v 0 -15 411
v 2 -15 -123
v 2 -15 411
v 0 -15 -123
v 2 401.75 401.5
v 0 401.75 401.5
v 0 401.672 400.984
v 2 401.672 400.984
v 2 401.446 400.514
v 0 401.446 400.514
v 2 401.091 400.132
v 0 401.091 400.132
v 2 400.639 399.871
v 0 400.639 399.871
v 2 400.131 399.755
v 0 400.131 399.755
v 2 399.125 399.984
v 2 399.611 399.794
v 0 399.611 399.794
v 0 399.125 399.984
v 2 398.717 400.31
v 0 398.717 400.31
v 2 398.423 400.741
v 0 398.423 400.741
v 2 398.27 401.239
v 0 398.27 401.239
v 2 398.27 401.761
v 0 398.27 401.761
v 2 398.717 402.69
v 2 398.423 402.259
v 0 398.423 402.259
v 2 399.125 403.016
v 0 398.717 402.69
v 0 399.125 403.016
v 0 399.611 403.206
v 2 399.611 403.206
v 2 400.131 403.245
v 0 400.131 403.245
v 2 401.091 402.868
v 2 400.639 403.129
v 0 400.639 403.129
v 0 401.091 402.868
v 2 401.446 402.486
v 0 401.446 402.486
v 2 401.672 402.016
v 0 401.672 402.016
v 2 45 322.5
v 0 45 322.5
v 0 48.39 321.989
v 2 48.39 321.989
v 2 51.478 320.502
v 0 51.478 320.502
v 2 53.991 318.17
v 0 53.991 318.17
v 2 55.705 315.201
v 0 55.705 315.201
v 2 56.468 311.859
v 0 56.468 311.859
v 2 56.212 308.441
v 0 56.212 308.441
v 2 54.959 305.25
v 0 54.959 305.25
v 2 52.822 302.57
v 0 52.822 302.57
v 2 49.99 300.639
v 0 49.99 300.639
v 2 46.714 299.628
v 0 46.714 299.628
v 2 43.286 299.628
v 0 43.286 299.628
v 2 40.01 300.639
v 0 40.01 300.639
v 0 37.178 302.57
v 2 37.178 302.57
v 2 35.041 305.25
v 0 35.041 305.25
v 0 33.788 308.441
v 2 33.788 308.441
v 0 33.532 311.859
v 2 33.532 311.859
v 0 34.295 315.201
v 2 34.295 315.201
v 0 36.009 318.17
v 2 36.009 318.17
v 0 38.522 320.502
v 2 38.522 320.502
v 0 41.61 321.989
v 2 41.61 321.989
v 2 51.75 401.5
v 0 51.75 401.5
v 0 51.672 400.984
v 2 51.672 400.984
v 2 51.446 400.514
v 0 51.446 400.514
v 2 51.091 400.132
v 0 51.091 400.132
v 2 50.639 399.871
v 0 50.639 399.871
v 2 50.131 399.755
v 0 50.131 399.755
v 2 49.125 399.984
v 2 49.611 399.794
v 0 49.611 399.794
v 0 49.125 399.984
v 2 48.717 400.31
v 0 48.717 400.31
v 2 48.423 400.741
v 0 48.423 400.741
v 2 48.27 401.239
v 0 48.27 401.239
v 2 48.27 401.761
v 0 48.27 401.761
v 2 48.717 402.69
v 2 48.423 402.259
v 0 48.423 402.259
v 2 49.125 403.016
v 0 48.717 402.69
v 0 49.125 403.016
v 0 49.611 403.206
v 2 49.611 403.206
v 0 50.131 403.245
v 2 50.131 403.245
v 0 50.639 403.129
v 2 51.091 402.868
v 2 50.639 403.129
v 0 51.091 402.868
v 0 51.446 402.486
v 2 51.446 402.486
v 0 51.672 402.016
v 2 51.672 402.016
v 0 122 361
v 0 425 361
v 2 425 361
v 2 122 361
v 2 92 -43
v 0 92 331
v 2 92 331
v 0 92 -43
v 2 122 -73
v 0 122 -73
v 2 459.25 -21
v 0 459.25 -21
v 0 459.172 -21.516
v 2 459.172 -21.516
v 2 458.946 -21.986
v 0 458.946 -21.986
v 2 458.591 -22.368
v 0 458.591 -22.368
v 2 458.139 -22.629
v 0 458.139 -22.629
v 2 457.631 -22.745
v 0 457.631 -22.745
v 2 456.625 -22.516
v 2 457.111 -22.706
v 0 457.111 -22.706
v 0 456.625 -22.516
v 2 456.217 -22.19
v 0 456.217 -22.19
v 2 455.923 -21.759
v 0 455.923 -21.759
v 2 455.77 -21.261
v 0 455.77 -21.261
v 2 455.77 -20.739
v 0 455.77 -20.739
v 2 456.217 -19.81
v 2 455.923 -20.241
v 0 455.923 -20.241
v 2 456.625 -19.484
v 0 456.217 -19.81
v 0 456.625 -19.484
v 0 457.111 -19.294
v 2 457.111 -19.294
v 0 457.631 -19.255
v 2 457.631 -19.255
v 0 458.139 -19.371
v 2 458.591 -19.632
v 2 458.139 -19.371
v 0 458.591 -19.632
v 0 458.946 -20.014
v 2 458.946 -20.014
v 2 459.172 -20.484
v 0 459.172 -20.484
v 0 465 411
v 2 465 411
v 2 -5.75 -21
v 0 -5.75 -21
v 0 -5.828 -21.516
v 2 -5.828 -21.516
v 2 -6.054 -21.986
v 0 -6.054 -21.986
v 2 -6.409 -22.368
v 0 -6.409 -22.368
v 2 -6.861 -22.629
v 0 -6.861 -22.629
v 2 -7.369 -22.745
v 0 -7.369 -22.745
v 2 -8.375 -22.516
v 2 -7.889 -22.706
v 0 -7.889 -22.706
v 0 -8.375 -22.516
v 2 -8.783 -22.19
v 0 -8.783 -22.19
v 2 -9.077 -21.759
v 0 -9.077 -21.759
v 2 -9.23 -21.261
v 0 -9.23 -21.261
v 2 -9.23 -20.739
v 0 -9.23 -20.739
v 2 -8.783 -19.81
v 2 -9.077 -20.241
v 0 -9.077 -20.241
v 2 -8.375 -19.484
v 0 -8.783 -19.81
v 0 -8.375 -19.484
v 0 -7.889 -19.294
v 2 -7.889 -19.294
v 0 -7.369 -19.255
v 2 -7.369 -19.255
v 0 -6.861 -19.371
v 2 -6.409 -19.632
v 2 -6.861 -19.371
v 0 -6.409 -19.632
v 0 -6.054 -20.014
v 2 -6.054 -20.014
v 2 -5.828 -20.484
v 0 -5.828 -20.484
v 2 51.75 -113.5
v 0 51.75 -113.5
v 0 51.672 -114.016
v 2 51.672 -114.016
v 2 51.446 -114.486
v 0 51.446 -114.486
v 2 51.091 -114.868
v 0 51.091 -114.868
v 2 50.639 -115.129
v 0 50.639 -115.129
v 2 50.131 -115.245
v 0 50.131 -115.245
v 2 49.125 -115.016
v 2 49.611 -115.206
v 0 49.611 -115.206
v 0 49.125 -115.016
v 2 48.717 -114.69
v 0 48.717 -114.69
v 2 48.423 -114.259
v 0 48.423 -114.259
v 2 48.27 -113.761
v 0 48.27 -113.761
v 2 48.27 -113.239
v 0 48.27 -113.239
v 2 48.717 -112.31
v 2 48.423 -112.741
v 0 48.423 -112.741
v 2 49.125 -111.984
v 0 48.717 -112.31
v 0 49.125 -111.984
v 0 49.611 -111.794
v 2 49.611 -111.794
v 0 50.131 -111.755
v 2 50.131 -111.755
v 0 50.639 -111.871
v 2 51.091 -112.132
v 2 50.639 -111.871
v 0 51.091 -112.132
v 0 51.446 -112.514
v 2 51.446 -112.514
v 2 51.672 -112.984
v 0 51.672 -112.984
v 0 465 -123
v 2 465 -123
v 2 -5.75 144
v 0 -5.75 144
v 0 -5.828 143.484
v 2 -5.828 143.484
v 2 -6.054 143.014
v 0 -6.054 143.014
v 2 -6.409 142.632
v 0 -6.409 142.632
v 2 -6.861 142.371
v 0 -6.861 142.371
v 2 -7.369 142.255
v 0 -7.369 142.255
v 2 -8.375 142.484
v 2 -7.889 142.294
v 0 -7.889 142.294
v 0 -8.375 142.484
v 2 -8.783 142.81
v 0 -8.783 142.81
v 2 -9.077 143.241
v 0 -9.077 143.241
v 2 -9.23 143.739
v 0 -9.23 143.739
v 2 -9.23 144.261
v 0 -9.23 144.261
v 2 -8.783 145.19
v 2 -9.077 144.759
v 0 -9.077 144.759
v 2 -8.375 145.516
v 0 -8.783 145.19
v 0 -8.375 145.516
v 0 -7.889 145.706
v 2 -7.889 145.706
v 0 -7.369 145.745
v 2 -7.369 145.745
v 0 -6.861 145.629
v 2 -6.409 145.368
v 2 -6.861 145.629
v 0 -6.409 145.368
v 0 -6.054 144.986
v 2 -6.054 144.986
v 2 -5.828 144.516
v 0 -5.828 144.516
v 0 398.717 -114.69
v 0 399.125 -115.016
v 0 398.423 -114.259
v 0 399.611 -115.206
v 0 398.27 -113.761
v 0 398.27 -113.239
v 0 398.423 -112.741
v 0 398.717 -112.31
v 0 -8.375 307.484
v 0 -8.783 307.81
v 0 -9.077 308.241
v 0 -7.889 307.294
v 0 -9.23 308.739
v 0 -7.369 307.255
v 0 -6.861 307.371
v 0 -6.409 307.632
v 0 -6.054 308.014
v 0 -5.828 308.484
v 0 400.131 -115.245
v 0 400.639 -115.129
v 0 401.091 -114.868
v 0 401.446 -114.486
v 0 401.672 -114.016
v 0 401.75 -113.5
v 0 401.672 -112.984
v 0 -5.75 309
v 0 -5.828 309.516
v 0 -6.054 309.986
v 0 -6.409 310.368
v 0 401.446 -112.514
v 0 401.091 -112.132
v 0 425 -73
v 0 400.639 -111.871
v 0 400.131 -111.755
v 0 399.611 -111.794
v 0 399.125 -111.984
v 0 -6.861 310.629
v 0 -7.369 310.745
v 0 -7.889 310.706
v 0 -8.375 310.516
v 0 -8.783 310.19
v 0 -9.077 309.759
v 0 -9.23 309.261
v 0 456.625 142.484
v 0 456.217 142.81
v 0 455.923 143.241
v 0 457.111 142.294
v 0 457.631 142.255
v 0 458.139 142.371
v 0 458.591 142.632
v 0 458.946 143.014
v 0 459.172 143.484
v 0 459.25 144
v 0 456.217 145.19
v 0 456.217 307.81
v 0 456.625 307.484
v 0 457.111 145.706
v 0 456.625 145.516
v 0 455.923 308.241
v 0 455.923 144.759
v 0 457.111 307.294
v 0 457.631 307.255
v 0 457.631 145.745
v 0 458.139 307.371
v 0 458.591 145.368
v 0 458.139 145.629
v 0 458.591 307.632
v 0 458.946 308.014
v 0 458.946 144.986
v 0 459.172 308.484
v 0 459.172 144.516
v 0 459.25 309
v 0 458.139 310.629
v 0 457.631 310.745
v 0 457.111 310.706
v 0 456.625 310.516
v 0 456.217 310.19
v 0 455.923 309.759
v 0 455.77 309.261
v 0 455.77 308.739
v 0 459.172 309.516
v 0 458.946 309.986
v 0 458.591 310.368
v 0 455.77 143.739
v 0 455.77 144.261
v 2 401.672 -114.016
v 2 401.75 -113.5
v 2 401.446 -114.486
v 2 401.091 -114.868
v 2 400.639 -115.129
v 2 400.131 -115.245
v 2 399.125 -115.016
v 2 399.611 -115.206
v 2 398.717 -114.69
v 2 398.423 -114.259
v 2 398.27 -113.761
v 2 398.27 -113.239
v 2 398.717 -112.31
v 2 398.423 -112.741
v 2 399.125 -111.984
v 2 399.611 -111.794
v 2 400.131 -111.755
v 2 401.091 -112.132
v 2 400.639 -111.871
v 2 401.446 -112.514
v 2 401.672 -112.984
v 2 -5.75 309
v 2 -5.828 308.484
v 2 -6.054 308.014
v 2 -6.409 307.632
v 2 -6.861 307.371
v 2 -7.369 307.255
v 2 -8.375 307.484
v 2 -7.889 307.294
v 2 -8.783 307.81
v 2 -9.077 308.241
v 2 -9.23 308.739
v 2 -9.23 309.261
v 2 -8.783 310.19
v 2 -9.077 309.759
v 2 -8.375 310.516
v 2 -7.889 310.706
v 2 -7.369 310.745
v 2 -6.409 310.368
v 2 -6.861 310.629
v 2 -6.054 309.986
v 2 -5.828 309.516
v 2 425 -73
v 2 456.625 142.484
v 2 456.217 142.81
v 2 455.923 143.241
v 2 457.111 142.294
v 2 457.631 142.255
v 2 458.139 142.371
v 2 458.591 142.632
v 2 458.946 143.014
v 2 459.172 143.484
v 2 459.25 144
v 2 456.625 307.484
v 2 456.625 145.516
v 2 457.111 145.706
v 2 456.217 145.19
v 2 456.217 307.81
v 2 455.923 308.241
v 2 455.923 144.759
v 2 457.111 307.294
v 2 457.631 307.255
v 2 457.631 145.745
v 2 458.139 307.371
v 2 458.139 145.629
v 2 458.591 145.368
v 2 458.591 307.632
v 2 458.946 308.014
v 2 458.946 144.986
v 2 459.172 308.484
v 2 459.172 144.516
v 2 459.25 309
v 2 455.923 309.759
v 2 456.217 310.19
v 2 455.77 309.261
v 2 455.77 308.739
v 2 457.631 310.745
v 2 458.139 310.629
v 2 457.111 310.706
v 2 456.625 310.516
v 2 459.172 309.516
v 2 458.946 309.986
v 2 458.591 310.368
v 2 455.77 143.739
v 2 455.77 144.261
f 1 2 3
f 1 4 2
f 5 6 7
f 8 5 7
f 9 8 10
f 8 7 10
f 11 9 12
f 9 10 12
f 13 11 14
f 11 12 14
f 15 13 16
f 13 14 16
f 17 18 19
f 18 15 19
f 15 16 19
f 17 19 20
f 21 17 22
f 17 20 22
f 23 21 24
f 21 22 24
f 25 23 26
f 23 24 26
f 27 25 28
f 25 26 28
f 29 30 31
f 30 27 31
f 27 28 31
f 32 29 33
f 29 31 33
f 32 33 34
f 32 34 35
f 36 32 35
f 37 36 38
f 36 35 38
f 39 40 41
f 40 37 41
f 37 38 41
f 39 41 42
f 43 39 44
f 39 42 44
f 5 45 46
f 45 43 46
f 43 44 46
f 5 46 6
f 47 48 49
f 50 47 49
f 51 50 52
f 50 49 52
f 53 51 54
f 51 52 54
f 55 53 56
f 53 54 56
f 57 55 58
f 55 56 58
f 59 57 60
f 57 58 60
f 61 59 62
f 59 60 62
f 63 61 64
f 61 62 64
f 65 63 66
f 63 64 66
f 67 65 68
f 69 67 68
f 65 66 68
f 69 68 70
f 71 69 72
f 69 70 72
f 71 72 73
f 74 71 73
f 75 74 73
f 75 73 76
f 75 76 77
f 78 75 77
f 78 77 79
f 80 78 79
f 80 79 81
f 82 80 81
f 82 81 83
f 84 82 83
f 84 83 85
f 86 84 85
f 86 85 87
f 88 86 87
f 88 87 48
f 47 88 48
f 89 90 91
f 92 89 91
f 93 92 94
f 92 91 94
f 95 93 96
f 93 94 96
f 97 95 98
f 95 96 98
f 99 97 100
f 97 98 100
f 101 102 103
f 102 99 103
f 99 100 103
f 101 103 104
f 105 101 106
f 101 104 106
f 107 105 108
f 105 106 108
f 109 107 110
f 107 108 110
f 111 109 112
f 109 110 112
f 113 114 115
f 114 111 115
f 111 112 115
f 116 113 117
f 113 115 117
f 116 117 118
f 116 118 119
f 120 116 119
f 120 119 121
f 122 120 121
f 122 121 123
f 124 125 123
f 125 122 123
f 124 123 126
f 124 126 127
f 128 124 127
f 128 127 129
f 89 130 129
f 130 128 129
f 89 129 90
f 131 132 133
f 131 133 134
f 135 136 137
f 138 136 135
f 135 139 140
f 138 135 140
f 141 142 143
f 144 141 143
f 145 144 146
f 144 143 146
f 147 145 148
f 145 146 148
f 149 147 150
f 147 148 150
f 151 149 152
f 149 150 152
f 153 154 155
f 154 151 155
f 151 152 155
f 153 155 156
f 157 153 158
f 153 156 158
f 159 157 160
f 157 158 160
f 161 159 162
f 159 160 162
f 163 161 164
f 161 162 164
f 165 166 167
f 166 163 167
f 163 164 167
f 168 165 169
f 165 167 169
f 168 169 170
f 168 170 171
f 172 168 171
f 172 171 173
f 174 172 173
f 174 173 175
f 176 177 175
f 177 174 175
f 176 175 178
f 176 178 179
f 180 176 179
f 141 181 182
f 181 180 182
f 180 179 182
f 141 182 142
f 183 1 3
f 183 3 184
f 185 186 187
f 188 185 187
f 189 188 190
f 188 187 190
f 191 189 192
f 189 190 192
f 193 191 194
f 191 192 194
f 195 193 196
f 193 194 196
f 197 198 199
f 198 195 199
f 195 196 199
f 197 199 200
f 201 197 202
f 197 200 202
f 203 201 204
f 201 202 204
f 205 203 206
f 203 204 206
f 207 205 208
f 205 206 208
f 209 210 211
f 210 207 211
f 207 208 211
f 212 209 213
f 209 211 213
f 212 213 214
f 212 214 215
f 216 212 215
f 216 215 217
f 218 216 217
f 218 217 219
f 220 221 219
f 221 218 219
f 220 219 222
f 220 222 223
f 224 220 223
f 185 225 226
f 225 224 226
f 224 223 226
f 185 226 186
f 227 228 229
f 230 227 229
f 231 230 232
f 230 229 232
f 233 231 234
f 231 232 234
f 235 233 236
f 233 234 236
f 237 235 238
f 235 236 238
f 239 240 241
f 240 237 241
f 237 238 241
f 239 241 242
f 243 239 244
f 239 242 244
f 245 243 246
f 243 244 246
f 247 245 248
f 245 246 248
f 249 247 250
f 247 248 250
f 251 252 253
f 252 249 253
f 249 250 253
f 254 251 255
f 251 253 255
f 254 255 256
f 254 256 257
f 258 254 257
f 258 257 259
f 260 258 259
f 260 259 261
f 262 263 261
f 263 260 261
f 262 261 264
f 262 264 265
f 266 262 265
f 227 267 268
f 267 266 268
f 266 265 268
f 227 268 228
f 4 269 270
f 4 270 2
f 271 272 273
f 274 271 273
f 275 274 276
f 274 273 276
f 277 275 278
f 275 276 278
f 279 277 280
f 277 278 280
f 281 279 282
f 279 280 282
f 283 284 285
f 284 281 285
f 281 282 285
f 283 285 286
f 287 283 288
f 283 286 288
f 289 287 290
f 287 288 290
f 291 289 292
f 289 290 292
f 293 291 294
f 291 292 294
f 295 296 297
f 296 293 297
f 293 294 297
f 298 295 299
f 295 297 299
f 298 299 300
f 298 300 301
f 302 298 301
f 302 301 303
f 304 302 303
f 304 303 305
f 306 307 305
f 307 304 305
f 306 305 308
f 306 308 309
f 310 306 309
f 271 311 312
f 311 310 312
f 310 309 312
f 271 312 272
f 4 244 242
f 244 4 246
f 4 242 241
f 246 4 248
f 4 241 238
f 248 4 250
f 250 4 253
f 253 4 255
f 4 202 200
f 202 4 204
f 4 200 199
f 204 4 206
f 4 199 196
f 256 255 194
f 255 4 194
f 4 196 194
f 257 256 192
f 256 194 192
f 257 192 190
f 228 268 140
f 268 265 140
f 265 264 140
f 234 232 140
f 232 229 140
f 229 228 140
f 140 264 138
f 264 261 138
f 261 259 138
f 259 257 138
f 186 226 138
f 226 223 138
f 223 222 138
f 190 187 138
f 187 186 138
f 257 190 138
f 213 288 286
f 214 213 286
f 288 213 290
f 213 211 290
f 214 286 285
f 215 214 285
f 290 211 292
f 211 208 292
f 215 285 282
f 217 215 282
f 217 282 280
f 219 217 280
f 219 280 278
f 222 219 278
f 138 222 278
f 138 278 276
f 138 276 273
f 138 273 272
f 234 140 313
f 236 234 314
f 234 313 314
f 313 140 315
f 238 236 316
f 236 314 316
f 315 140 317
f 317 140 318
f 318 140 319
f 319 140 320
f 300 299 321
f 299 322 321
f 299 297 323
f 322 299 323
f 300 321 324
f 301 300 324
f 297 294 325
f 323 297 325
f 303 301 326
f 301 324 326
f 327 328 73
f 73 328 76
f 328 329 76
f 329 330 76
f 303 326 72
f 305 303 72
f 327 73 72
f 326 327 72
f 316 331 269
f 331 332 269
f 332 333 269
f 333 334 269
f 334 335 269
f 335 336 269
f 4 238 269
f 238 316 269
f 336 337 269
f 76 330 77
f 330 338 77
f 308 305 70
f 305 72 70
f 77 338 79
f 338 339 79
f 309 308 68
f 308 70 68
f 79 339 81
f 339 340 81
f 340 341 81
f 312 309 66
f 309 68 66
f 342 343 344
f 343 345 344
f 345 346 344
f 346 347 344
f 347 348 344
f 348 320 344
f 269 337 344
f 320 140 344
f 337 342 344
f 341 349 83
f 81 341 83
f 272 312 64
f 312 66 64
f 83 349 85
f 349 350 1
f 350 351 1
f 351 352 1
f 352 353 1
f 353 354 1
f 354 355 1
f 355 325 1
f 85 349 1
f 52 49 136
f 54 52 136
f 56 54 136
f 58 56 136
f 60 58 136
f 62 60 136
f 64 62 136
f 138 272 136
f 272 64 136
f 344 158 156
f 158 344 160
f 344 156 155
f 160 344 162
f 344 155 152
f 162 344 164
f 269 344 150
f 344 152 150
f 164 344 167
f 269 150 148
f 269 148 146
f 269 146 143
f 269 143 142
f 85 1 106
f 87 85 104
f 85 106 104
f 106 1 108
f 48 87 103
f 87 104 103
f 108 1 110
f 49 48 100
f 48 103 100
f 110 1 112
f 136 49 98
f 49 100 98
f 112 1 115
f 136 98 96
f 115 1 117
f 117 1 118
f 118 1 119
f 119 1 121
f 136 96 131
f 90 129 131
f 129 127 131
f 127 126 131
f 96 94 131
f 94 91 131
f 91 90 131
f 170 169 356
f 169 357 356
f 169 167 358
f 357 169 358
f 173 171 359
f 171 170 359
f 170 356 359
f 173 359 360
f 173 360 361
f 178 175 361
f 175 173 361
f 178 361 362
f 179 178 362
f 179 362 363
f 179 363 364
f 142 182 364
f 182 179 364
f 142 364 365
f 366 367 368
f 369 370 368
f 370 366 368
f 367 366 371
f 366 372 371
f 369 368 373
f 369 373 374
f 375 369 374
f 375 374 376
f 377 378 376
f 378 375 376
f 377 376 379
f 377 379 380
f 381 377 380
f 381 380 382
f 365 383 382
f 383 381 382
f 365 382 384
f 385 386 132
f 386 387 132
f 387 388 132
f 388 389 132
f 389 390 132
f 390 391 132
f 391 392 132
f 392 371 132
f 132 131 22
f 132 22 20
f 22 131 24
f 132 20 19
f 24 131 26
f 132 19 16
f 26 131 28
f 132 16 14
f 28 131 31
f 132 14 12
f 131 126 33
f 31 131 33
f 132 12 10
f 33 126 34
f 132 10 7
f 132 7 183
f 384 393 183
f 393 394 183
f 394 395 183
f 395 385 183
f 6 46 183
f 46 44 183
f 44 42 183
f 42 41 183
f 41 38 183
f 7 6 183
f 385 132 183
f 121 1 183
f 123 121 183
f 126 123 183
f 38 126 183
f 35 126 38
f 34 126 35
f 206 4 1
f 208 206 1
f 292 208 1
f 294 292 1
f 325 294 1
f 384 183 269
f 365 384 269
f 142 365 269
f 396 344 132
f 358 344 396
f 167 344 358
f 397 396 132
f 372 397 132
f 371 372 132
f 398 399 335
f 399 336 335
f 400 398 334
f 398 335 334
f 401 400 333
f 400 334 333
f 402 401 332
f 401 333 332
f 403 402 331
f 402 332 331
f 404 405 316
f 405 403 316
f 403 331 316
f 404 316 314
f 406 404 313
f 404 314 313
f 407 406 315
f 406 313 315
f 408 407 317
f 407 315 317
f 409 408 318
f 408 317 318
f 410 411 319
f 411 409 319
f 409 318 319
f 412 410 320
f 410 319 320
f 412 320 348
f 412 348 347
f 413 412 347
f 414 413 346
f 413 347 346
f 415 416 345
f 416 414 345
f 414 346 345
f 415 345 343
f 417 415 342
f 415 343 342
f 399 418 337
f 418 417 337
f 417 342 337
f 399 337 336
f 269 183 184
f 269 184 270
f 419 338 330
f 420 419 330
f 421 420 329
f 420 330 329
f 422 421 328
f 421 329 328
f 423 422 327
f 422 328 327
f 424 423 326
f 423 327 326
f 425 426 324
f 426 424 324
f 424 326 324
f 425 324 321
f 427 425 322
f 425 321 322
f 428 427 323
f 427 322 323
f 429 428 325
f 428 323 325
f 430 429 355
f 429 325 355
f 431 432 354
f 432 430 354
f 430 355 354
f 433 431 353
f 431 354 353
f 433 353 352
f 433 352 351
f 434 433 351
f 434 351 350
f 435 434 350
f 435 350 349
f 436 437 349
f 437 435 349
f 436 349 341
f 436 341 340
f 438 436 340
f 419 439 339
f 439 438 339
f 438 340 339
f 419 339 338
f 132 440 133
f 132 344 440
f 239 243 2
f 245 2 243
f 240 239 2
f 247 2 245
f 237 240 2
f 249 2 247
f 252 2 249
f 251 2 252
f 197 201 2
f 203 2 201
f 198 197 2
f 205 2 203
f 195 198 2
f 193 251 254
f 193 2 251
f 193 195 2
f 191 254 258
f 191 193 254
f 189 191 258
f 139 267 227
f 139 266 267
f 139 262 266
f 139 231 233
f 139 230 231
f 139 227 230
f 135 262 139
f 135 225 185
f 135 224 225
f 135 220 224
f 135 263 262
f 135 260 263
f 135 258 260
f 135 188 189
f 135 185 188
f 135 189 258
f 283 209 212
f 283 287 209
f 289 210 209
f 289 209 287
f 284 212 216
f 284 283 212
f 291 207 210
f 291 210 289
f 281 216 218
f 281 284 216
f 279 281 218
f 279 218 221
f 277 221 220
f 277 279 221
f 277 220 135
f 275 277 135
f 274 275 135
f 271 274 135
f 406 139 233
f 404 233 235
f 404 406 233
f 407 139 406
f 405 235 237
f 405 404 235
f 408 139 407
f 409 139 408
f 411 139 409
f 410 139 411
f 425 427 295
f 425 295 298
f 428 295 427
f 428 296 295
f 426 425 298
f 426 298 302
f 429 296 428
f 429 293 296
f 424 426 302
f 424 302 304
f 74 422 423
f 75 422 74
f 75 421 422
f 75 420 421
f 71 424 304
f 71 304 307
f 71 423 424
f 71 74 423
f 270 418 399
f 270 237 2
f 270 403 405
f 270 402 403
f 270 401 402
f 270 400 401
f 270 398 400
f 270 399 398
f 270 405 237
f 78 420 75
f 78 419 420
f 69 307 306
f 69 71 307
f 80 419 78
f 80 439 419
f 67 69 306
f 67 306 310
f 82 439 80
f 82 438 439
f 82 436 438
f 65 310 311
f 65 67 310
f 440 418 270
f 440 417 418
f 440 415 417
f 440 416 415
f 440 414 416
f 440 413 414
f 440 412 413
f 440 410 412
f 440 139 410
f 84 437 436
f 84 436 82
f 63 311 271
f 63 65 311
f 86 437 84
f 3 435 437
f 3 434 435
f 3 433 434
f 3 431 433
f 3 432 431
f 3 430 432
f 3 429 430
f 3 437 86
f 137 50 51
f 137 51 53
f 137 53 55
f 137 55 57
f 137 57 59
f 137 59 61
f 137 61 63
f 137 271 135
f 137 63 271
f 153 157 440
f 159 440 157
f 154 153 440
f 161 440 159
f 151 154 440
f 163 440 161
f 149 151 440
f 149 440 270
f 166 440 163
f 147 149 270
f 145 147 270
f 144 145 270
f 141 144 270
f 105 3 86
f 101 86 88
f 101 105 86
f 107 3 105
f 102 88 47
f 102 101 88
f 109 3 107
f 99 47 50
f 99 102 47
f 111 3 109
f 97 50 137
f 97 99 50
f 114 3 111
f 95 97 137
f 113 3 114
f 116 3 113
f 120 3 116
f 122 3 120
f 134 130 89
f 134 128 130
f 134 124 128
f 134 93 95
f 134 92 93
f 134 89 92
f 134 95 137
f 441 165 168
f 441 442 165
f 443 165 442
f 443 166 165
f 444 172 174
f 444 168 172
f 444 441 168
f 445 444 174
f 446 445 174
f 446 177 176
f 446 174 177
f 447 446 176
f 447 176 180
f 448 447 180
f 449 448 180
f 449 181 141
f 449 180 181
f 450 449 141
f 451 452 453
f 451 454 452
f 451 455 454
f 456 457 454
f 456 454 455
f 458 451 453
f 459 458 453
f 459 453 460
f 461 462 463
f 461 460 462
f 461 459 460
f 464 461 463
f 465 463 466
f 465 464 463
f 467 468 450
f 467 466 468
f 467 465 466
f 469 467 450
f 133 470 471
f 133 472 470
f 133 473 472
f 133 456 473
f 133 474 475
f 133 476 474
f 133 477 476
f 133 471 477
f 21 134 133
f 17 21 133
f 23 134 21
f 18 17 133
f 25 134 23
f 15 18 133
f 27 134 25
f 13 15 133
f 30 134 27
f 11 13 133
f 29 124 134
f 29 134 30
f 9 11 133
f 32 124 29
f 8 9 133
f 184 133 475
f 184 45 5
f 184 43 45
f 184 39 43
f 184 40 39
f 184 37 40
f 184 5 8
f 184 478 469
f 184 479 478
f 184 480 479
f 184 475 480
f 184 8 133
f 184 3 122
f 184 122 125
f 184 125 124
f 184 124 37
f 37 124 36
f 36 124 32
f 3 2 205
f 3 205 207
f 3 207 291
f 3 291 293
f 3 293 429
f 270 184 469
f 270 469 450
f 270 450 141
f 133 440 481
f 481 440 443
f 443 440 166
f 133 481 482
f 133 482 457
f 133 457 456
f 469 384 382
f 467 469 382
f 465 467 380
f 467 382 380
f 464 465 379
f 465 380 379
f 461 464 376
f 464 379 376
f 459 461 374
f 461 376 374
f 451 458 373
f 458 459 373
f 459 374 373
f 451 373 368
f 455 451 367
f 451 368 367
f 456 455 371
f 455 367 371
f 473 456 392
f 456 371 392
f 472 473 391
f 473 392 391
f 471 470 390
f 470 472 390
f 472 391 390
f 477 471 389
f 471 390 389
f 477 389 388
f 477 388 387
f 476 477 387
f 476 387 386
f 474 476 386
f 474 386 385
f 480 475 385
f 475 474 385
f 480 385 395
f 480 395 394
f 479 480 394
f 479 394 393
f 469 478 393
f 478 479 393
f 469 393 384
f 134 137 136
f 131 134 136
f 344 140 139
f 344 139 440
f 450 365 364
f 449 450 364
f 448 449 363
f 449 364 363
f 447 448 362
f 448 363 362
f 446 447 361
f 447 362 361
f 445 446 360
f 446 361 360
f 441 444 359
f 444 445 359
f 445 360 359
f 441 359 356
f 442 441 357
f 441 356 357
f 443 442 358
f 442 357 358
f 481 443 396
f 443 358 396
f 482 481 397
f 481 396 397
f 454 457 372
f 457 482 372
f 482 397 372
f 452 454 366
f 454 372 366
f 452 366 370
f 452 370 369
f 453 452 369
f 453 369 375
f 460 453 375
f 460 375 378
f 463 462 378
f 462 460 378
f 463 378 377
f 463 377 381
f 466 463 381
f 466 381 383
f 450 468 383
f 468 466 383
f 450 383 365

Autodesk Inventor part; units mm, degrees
ref_plane "YZ Plane" through (0, 0, 0) normal (1, 0, 0) x (0, 1, 0)
ref_plane "XZ Plane" through (0, 0, 0) normal (0, 1, 0) x (-1, 0, 0)
ref_plane "XY Plane" through (0, 0, 0) normal (0, 0, 1) x (1, 0, 0)
sketch "Sketch1" plane through (0, 0, 0) normal (1, 0, 0) x (0, 1, 0)
  line L0 (465, 411) -> (465, -123) projected
  line L1 (465, -123) -> (-15, -123) projected
  line L2 (-15, -123) -> (-15, 411) projected
  line L3 (-15, 411) -> (465, 411) projected
  circle A0 centre (400, -113.5) radius 1.75 projected
  circle A1 centre (50, 401.5) radius 1.75 projected
  circle A2 centre (400, 401.5) radius 1.75 projected
  circle A3 centre (-7.5, -21) radius 1.75 projected
  circle A4 centre (-7.5, 144) radius 1.75 projected
  circle A5 centre (-7.5, 309) radius 1.75 projected
  circle A6 centre (457.5, 144) radius 1.75 projected
  circle A7 centre (457.5, -21) radius 1.75 projected
  circle A8 centre (457.5, 309) radius 1.75 projected
  circle A9 centre (50, -113.5) radius 1.75 projected
  point P0 (0, 0)
extrude "Extrusion1" add sketch "Sketch1" along normal blind 2
sketch "Sketch2" plane through (0, 0, 0) normal (-1, 0, 0) x (0, 0, 1)
  line L0 (411, -15) -> (-123, -15) projected
  line L1 (411, 465) -> (411, -15) projected
  line L2 (-123, 465) -> (411, 465) projected
  line L3 (-123, -15) -> (-123, 465) projected
  circle A0 centre (-113.5, 50) radius 1.75 projected
  circle A1 centre (-21, 457.5) radius 1.75 projected
  circle A2 centre (144, 457.5) radius 1.75 projected
  circle A3 centre (309, -7.5) radius 1.75 projected
  circle A4 centre (144, -7.5) radius 1.75 projected
  circle A5 centre (-21, -7.5) radius 1.75 projected
  circle A6 centre (401.5, 400) radius 1.75 projected
  circle A7 centre (401.5, 50) radius 1.75 projected
  circle A8 centre (-113.5, 400) radius 1.75 projected
  circle A9 centre (309, 457.5) radius 1.75 projected
  line L4 (-73, 425) -> (361, 425)
  line L5 (361, 425) -> (361, 92)
  line L6 (361, 92) -> (-73, 92)
  line L7 (-73, 92) -> (-73, 425)
  point P0 (0, 0)
  dimension "d2" = 50
  dimension "d3" = 50
  dimension "d4" = 40
  dimension "d5" = 107
extrude "Extrusion2" cut sketch "Sketch2" against normal blind 2 contours L4 L5 L6 L7
chamfer "Chamfer1" distance 30 angle 45 2 edges at (1, 92, -73) (1, 92, 361)
sketch "Sketch3" plane through (0, 0, 0) normal (-1, 0, 0) x (0, 0, 1)
  line L0 (361, 425) -> (361, 122) projected
  line L1 (331, 92) -> (361, 122) projected
  line L2 (331, 92) -> (-43, 92) projected
  line L3 (-73, 122) -> (-43, 92) projected
  line L4 (-73, 122) -> (-73, 425) projected
  line L5 (-73, 425) -> (361, 425) projected
  line L6 (411, -15) -> (-123, -15) projected
  line L7 (411, 465) -> (411, -15) projected
  line L8 (-123, 465) -> (411, 465) projected
  line L9 (-123, -15) -> (-123, 465) projected
  circle A0 centre (-113.5, 50) radius 1.75 projected
  circle A1 centre (-21, 457.5) radius 1.75 projected
  circle A2 centre (144, 457.5) radius 1.75 projected
  circle A3 centre (309, -7.5) radius 1.75 projected
  circle A4 centre (144, -7.5) radius 1.75 projected
  circle A5 centre (-21, -7.5) radius 1.75 projected
  circle A6 centre (401.5, 400) radius 1.75 projected
  circle A7 centre (401.5, 50) radius 1.75 projected
  circle A8 centre (-113.5, 400) radius 1.75 projected
  circle A9 centre (309, 457.5) radius 1.75 projected
  circle A10 centre (311, 45) radius 11.5
  point P0 (0, 0)
  dimension "d11" = 23
  dimension "d12" = 60
  dimension "d13" = 100
extrude "Extrusion3" cut sketch "Sketch3" against normal through all contours A10
equation "\"d3\" = d2"
properties part number "Front Panel" material "Aluminum 6061"
